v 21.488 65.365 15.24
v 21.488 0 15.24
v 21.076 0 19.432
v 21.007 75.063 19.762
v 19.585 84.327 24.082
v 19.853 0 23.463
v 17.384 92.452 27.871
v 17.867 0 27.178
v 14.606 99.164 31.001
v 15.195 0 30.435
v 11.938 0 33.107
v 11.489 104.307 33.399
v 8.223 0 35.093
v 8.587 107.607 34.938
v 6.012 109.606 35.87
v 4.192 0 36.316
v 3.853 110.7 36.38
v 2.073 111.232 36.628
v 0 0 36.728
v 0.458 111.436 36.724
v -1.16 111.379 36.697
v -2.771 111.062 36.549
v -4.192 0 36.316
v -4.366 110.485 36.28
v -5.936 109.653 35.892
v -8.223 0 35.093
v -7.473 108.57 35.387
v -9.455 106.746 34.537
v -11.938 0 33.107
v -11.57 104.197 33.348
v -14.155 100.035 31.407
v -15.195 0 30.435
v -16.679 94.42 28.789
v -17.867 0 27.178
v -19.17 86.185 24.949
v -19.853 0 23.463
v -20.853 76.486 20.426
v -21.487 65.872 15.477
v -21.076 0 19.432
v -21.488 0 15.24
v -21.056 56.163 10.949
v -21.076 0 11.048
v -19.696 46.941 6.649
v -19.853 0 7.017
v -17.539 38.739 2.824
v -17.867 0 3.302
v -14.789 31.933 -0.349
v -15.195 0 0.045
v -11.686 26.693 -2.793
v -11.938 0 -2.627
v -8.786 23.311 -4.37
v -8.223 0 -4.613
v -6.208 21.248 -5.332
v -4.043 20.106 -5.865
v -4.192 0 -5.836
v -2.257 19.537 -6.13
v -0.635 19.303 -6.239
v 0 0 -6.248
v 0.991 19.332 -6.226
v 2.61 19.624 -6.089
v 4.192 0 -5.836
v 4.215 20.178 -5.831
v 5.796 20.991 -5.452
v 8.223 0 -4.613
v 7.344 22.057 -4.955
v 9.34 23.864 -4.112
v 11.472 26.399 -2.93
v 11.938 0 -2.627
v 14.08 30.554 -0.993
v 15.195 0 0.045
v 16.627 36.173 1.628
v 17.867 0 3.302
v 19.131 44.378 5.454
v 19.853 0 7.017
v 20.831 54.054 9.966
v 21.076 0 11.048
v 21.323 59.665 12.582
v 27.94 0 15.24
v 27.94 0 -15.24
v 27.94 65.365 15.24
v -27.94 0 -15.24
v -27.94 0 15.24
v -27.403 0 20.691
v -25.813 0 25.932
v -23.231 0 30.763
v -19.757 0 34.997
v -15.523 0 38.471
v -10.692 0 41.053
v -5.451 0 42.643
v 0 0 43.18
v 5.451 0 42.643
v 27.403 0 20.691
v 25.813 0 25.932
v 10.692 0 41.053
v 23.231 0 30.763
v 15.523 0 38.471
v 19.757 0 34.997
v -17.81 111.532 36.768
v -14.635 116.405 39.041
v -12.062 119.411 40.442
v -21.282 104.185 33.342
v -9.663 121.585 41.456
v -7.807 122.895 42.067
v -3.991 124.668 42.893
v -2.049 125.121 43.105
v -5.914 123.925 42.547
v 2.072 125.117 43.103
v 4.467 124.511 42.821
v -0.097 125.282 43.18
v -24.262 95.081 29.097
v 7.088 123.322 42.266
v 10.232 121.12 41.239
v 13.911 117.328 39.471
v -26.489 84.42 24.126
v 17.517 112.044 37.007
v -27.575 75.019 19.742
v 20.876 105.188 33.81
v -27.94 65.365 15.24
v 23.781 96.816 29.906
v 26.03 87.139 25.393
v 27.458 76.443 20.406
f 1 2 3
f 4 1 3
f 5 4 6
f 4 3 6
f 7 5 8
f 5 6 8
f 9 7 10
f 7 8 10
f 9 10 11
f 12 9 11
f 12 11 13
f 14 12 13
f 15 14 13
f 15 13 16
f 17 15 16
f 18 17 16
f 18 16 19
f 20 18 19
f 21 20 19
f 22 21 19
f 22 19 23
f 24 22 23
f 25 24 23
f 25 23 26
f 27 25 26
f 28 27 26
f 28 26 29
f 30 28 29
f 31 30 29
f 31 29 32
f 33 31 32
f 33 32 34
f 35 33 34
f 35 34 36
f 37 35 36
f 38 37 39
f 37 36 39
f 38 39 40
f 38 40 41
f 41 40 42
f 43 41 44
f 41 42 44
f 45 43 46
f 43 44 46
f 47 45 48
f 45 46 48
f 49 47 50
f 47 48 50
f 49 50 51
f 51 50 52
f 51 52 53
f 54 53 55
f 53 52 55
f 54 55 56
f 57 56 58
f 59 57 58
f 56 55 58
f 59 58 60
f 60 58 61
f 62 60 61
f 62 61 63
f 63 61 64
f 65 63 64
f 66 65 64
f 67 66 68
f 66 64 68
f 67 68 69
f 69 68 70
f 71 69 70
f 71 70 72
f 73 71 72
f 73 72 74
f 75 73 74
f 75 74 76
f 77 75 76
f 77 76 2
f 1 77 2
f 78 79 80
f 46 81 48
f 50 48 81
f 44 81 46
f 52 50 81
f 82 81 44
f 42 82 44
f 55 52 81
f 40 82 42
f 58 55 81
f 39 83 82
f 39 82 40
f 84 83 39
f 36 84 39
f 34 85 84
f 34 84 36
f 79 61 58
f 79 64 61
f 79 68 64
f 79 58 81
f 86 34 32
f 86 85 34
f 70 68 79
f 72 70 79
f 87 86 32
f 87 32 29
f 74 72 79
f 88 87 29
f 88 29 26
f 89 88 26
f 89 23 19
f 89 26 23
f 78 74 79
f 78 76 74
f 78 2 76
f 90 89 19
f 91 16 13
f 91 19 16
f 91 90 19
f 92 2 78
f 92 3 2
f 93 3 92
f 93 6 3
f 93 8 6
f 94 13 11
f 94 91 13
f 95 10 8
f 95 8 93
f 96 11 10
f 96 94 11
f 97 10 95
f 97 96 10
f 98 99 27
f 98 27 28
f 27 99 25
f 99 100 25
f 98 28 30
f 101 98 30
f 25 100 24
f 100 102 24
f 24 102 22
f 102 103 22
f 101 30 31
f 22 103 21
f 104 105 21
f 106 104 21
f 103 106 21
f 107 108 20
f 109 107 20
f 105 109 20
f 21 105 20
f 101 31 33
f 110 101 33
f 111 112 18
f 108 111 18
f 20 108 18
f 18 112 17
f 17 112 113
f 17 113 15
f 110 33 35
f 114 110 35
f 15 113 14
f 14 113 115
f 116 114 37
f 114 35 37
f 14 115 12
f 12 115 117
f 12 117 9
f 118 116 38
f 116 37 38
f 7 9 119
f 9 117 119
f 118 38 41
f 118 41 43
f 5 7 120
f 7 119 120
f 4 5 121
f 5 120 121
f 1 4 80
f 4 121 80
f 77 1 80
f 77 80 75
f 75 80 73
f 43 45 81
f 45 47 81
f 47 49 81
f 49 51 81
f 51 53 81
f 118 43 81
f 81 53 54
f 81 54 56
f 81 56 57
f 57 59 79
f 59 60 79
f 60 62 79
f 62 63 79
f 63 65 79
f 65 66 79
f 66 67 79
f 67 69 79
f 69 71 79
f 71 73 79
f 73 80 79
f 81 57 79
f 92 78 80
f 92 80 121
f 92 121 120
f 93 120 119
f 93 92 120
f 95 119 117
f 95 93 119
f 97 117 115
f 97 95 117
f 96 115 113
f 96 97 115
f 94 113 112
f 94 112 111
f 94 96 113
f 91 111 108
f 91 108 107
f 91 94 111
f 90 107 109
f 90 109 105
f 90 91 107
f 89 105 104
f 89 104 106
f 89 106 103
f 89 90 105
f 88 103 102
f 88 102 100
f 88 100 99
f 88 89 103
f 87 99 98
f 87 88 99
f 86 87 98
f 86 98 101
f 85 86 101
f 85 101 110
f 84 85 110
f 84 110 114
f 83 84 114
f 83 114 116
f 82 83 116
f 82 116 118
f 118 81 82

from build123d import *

# Parameters (mm, degrees)
F0_W     = 55.88
F0_H     = 30.48
F1_DEPTH = 127
F2_R     = 21.4884
F3_DEPTH = 127.001
F5_DEPTH = 55.881


with BuildPart() as f1:
    # F0 (on Front) → F1 (new body)
    with BuildSketch(Plane.XZ):
        with BuildLine():
            Line((-27.94, 15.24), (27.94, 15.24))
            ThreePointArc((27.94, 15.24), (0, 43.18), (-27.94, 15.24))
        make_face()
        Rectangle(F0_W, F0_H)
    extrude(amount=-F1_DEPTH)

    # F2 (on face) → F3 (cut, through all)
    with BuildSketch(Plane.XZ):
        with Locations((0, 15.24)):
            Circle(F2_R)
    extrude(amount=-F3_DEPTH, mode=Mode.SUBTRACT)

    # F4 (on face) → F5 (cut, through all)
    with BuildSketch(Plane.YZ.offset(27.94)):
        Polygon((267.642255, 109.563633), (0, -15.24), (267.642255, -15.24), align=None)
    extrude(amount=-F5_DEPTH, mode=Mode.SUBTRACT)


solid = f1.part
